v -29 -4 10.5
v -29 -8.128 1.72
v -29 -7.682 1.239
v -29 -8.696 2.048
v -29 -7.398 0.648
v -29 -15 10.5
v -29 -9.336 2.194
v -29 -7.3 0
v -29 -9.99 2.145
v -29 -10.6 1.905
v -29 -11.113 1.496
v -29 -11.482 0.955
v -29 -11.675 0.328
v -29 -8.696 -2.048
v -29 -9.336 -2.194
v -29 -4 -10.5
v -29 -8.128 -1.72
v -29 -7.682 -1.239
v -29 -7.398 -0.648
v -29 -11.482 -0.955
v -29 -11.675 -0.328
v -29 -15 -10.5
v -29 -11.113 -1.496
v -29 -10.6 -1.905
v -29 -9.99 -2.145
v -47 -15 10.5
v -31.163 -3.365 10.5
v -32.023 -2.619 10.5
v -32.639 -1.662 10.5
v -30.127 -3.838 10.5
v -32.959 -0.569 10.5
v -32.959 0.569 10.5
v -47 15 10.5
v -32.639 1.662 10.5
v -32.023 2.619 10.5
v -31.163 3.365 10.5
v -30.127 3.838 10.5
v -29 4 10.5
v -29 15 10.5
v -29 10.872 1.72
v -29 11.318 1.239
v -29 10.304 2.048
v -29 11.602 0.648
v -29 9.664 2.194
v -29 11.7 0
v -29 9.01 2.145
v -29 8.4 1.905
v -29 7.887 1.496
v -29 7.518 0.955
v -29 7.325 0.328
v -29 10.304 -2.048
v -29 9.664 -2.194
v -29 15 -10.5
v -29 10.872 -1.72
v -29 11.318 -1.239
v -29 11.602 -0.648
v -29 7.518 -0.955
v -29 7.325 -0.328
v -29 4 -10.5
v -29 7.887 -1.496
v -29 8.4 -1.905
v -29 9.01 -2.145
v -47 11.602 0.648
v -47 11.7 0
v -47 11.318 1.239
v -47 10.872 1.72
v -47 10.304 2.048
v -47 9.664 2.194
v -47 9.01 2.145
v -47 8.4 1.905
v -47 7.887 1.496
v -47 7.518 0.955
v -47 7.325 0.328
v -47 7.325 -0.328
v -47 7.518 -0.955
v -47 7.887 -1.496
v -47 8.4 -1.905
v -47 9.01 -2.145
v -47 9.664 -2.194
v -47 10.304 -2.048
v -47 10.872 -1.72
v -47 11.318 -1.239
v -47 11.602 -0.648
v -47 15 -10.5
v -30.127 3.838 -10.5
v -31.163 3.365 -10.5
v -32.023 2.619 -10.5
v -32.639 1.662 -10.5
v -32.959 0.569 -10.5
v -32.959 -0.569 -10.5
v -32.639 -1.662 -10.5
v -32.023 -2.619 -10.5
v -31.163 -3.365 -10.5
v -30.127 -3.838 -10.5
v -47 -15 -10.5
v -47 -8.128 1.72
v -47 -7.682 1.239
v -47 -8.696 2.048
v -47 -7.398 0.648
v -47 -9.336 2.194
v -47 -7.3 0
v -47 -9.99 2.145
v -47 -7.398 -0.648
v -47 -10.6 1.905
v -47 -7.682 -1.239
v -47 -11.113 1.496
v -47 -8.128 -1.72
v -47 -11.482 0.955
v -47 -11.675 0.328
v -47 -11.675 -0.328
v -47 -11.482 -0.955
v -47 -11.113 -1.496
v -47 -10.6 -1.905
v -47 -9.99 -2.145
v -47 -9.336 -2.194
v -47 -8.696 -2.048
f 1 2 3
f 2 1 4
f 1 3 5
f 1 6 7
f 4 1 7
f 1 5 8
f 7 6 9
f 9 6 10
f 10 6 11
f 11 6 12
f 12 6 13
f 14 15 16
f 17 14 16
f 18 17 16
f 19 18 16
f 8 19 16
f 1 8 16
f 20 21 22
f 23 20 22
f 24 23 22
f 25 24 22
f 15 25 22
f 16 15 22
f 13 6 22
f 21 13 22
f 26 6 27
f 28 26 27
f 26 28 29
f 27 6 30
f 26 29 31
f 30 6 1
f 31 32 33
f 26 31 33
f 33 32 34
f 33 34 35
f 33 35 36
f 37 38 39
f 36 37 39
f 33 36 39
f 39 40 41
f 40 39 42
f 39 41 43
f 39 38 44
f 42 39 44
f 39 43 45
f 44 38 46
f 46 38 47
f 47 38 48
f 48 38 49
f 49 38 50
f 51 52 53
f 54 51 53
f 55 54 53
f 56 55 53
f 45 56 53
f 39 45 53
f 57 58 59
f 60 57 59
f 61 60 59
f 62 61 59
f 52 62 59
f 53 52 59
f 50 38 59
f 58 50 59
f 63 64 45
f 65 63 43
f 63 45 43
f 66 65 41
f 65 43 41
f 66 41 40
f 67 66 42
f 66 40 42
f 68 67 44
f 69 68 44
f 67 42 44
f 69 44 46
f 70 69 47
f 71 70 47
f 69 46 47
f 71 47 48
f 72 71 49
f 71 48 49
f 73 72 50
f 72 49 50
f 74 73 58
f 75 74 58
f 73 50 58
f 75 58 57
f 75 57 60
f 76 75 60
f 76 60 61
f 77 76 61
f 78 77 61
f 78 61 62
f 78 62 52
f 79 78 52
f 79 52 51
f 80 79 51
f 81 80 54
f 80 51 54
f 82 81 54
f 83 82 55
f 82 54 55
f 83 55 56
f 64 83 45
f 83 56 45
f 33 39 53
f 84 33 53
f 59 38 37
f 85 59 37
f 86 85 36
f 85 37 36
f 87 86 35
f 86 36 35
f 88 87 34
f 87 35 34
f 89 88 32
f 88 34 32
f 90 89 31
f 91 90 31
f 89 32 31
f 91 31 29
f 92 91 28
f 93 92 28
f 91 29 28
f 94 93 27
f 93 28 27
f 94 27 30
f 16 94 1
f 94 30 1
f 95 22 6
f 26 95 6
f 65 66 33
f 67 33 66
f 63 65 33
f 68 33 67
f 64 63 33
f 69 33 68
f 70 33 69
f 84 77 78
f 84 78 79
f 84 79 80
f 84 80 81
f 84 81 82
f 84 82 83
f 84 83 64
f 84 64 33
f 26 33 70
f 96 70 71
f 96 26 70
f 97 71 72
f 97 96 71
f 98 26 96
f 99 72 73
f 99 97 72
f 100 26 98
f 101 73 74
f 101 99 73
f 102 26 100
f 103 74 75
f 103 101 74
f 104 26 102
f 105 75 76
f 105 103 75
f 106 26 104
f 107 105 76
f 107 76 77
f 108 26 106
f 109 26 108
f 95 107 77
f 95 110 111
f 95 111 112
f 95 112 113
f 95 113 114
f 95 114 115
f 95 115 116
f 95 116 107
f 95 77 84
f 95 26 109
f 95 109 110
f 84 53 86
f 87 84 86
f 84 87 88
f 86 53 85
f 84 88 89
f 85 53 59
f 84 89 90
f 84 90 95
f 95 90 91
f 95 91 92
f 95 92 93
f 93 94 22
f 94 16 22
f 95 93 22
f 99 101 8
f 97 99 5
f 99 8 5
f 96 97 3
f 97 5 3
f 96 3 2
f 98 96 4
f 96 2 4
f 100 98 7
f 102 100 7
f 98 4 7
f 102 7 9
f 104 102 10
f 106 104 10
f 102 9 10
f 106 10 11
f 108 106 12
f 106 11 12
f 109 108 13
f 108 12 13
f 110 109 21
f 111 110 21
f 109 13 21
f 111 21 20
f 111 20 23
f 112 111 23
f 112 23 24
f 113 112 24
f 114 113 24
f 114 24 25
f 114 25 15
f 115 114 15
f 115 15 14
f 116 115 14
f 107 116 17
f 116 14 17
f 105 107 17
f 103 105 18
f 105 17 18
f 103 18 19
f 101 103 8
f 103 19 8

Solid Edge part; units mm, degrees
sketch "Sketch1" plane through (-29, 0, 0) normal (1, 0, 0) x (0, 1, 0)
  circle A0 centre (-9.5, 0) radius 2.2
  line L0 (15, -10.5) -> (-15, -10.5)
  line L1 (-15, -10.5) -> (-15, 10.5)
  line L2 (-15, 10.5) -> (15, 10.5)
  line L3 (15, 10.5) -> (15, -10.5)
  circle A1 centre (9.5, 0) radius 2.2
  dimension "D1" = 15
  dimension "D2" = 15
extrude "ExtrudedProtrusion_1" add sketch "Sketch1" against normal blind 18
sketch "Sketch2" plane through (-36.5, 0, 10.5) normal (0, 0, 1) x (0, -1, 0)
  circle A0 centre (0, 7.5) radius 4
extrude "Cutout1" cut sketch "Sketch2" against normal through all
